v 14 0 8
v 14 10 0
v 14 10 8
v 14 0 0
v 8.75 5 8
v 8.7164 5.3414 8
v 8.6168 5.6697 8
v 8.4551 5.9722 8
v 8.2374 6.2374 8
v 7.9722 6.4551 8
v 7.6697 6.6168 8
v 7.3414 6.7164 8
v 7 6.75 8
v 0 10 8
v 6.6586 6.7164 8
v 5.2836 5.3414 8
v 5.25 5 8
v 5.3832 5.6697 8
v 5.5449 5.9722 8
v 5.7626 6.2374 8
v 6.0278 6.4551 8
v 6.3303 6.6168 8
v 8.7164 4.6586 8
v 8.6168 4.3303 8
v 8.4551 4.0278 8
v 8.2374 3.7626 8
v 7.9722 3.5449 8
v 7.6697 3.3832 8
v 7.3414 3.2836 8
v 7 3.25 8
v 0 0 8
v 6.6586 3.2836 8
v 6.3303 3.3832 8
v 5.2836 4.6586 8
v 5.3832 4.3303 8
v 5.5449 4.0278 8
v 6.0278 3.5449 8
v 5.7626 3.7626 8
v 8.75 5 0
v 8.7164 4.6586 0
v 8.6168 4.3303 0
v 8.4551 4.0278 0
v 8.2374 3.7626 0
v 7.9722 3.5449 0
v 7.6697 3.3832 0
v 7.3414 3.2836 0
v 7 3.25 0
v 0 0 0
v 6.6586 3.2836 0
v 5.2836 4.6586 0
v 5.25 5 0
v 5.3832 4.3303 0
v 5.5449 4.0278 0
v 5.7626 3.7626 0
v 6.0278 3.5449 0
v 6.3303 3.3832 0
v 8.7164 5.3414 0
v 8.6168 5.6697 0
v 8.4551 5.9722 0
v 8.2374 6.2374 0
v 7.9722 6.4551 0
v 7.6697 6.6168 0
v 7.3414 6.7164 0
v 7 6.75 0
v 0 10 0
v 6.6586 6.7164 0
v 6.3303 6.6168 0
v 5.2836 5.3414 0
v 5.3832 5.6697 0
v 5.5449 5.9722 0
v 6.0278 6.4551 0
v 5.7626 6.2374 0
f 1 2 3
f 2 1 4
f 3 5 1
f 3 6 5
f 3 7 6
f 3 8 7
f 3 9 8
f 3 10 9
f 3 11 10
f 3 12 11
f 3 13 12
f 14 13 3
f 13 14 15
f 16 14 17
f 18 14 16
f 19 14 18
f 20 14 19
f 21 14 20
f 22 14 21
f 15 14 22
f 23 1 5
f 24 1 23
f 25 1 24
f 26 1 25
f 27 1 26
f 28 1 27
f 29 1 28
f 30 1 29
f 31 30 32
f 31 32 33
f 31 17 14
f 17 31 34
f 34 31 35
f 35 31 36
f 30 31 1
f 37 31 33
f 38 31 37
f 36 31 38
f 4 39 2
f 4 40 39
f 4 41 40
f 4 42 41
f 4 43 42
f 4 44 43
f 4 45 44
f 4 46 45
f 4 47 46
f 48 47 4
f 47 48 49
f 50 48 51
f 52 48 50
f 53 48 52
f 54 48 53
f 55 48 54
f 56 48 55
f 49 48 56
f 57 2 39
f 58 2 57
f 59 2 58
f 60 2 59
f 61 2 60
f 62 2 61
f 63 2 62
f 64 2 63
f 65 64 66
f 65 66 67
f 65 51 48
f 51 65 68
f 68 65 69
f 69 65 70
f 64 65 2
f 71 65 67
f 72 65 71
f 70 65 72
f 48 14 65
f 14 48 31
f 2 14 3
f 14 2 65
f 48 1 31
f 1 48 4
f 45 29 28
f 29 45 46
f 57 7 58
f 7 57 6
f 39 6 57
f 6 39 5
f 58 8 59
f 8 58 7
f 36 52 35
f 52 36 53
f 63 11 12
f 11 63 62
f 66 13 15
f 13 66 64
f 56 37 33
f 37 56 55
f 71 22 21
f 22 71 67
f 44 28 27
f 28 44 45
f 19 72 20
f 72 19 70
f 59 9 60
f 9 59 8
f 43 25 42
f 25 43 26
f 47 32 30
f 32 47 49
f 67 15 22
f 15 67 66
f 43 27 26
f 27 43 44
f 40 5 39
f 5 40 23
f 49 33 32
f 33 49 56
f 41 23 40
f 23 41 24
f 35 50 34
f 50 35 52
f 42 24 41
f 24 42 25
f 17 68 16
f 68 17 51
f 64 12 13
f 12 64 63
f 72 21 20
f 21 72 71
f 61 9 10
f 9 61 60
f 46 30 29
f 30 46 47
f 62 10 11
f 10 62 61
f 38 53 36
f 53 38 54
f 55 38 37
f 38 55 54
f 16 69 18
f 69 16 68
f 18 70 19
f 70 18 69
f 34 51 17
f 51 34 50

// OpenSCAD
$fn = 32;

// ----------------------------------------------------------------------
// Micro pad: drilled pad, 5-20 mm class
// ----------------------------------------------------------------------

// --- parameters (mm) ---
pad_l = 14;               // pad length, X
pad_w = 10;               // pad width, Y
pad_t = 8;                // pad thickness, Z
hole_d = 3.5;             // through hole diameter

difference() {
  cube([pad_l, pad_w, pad_t]);
  translate([pad_l / 2, pad_w / 2, -1])
    cylinder(h = pad_t + 2, d = hole_d);
}
